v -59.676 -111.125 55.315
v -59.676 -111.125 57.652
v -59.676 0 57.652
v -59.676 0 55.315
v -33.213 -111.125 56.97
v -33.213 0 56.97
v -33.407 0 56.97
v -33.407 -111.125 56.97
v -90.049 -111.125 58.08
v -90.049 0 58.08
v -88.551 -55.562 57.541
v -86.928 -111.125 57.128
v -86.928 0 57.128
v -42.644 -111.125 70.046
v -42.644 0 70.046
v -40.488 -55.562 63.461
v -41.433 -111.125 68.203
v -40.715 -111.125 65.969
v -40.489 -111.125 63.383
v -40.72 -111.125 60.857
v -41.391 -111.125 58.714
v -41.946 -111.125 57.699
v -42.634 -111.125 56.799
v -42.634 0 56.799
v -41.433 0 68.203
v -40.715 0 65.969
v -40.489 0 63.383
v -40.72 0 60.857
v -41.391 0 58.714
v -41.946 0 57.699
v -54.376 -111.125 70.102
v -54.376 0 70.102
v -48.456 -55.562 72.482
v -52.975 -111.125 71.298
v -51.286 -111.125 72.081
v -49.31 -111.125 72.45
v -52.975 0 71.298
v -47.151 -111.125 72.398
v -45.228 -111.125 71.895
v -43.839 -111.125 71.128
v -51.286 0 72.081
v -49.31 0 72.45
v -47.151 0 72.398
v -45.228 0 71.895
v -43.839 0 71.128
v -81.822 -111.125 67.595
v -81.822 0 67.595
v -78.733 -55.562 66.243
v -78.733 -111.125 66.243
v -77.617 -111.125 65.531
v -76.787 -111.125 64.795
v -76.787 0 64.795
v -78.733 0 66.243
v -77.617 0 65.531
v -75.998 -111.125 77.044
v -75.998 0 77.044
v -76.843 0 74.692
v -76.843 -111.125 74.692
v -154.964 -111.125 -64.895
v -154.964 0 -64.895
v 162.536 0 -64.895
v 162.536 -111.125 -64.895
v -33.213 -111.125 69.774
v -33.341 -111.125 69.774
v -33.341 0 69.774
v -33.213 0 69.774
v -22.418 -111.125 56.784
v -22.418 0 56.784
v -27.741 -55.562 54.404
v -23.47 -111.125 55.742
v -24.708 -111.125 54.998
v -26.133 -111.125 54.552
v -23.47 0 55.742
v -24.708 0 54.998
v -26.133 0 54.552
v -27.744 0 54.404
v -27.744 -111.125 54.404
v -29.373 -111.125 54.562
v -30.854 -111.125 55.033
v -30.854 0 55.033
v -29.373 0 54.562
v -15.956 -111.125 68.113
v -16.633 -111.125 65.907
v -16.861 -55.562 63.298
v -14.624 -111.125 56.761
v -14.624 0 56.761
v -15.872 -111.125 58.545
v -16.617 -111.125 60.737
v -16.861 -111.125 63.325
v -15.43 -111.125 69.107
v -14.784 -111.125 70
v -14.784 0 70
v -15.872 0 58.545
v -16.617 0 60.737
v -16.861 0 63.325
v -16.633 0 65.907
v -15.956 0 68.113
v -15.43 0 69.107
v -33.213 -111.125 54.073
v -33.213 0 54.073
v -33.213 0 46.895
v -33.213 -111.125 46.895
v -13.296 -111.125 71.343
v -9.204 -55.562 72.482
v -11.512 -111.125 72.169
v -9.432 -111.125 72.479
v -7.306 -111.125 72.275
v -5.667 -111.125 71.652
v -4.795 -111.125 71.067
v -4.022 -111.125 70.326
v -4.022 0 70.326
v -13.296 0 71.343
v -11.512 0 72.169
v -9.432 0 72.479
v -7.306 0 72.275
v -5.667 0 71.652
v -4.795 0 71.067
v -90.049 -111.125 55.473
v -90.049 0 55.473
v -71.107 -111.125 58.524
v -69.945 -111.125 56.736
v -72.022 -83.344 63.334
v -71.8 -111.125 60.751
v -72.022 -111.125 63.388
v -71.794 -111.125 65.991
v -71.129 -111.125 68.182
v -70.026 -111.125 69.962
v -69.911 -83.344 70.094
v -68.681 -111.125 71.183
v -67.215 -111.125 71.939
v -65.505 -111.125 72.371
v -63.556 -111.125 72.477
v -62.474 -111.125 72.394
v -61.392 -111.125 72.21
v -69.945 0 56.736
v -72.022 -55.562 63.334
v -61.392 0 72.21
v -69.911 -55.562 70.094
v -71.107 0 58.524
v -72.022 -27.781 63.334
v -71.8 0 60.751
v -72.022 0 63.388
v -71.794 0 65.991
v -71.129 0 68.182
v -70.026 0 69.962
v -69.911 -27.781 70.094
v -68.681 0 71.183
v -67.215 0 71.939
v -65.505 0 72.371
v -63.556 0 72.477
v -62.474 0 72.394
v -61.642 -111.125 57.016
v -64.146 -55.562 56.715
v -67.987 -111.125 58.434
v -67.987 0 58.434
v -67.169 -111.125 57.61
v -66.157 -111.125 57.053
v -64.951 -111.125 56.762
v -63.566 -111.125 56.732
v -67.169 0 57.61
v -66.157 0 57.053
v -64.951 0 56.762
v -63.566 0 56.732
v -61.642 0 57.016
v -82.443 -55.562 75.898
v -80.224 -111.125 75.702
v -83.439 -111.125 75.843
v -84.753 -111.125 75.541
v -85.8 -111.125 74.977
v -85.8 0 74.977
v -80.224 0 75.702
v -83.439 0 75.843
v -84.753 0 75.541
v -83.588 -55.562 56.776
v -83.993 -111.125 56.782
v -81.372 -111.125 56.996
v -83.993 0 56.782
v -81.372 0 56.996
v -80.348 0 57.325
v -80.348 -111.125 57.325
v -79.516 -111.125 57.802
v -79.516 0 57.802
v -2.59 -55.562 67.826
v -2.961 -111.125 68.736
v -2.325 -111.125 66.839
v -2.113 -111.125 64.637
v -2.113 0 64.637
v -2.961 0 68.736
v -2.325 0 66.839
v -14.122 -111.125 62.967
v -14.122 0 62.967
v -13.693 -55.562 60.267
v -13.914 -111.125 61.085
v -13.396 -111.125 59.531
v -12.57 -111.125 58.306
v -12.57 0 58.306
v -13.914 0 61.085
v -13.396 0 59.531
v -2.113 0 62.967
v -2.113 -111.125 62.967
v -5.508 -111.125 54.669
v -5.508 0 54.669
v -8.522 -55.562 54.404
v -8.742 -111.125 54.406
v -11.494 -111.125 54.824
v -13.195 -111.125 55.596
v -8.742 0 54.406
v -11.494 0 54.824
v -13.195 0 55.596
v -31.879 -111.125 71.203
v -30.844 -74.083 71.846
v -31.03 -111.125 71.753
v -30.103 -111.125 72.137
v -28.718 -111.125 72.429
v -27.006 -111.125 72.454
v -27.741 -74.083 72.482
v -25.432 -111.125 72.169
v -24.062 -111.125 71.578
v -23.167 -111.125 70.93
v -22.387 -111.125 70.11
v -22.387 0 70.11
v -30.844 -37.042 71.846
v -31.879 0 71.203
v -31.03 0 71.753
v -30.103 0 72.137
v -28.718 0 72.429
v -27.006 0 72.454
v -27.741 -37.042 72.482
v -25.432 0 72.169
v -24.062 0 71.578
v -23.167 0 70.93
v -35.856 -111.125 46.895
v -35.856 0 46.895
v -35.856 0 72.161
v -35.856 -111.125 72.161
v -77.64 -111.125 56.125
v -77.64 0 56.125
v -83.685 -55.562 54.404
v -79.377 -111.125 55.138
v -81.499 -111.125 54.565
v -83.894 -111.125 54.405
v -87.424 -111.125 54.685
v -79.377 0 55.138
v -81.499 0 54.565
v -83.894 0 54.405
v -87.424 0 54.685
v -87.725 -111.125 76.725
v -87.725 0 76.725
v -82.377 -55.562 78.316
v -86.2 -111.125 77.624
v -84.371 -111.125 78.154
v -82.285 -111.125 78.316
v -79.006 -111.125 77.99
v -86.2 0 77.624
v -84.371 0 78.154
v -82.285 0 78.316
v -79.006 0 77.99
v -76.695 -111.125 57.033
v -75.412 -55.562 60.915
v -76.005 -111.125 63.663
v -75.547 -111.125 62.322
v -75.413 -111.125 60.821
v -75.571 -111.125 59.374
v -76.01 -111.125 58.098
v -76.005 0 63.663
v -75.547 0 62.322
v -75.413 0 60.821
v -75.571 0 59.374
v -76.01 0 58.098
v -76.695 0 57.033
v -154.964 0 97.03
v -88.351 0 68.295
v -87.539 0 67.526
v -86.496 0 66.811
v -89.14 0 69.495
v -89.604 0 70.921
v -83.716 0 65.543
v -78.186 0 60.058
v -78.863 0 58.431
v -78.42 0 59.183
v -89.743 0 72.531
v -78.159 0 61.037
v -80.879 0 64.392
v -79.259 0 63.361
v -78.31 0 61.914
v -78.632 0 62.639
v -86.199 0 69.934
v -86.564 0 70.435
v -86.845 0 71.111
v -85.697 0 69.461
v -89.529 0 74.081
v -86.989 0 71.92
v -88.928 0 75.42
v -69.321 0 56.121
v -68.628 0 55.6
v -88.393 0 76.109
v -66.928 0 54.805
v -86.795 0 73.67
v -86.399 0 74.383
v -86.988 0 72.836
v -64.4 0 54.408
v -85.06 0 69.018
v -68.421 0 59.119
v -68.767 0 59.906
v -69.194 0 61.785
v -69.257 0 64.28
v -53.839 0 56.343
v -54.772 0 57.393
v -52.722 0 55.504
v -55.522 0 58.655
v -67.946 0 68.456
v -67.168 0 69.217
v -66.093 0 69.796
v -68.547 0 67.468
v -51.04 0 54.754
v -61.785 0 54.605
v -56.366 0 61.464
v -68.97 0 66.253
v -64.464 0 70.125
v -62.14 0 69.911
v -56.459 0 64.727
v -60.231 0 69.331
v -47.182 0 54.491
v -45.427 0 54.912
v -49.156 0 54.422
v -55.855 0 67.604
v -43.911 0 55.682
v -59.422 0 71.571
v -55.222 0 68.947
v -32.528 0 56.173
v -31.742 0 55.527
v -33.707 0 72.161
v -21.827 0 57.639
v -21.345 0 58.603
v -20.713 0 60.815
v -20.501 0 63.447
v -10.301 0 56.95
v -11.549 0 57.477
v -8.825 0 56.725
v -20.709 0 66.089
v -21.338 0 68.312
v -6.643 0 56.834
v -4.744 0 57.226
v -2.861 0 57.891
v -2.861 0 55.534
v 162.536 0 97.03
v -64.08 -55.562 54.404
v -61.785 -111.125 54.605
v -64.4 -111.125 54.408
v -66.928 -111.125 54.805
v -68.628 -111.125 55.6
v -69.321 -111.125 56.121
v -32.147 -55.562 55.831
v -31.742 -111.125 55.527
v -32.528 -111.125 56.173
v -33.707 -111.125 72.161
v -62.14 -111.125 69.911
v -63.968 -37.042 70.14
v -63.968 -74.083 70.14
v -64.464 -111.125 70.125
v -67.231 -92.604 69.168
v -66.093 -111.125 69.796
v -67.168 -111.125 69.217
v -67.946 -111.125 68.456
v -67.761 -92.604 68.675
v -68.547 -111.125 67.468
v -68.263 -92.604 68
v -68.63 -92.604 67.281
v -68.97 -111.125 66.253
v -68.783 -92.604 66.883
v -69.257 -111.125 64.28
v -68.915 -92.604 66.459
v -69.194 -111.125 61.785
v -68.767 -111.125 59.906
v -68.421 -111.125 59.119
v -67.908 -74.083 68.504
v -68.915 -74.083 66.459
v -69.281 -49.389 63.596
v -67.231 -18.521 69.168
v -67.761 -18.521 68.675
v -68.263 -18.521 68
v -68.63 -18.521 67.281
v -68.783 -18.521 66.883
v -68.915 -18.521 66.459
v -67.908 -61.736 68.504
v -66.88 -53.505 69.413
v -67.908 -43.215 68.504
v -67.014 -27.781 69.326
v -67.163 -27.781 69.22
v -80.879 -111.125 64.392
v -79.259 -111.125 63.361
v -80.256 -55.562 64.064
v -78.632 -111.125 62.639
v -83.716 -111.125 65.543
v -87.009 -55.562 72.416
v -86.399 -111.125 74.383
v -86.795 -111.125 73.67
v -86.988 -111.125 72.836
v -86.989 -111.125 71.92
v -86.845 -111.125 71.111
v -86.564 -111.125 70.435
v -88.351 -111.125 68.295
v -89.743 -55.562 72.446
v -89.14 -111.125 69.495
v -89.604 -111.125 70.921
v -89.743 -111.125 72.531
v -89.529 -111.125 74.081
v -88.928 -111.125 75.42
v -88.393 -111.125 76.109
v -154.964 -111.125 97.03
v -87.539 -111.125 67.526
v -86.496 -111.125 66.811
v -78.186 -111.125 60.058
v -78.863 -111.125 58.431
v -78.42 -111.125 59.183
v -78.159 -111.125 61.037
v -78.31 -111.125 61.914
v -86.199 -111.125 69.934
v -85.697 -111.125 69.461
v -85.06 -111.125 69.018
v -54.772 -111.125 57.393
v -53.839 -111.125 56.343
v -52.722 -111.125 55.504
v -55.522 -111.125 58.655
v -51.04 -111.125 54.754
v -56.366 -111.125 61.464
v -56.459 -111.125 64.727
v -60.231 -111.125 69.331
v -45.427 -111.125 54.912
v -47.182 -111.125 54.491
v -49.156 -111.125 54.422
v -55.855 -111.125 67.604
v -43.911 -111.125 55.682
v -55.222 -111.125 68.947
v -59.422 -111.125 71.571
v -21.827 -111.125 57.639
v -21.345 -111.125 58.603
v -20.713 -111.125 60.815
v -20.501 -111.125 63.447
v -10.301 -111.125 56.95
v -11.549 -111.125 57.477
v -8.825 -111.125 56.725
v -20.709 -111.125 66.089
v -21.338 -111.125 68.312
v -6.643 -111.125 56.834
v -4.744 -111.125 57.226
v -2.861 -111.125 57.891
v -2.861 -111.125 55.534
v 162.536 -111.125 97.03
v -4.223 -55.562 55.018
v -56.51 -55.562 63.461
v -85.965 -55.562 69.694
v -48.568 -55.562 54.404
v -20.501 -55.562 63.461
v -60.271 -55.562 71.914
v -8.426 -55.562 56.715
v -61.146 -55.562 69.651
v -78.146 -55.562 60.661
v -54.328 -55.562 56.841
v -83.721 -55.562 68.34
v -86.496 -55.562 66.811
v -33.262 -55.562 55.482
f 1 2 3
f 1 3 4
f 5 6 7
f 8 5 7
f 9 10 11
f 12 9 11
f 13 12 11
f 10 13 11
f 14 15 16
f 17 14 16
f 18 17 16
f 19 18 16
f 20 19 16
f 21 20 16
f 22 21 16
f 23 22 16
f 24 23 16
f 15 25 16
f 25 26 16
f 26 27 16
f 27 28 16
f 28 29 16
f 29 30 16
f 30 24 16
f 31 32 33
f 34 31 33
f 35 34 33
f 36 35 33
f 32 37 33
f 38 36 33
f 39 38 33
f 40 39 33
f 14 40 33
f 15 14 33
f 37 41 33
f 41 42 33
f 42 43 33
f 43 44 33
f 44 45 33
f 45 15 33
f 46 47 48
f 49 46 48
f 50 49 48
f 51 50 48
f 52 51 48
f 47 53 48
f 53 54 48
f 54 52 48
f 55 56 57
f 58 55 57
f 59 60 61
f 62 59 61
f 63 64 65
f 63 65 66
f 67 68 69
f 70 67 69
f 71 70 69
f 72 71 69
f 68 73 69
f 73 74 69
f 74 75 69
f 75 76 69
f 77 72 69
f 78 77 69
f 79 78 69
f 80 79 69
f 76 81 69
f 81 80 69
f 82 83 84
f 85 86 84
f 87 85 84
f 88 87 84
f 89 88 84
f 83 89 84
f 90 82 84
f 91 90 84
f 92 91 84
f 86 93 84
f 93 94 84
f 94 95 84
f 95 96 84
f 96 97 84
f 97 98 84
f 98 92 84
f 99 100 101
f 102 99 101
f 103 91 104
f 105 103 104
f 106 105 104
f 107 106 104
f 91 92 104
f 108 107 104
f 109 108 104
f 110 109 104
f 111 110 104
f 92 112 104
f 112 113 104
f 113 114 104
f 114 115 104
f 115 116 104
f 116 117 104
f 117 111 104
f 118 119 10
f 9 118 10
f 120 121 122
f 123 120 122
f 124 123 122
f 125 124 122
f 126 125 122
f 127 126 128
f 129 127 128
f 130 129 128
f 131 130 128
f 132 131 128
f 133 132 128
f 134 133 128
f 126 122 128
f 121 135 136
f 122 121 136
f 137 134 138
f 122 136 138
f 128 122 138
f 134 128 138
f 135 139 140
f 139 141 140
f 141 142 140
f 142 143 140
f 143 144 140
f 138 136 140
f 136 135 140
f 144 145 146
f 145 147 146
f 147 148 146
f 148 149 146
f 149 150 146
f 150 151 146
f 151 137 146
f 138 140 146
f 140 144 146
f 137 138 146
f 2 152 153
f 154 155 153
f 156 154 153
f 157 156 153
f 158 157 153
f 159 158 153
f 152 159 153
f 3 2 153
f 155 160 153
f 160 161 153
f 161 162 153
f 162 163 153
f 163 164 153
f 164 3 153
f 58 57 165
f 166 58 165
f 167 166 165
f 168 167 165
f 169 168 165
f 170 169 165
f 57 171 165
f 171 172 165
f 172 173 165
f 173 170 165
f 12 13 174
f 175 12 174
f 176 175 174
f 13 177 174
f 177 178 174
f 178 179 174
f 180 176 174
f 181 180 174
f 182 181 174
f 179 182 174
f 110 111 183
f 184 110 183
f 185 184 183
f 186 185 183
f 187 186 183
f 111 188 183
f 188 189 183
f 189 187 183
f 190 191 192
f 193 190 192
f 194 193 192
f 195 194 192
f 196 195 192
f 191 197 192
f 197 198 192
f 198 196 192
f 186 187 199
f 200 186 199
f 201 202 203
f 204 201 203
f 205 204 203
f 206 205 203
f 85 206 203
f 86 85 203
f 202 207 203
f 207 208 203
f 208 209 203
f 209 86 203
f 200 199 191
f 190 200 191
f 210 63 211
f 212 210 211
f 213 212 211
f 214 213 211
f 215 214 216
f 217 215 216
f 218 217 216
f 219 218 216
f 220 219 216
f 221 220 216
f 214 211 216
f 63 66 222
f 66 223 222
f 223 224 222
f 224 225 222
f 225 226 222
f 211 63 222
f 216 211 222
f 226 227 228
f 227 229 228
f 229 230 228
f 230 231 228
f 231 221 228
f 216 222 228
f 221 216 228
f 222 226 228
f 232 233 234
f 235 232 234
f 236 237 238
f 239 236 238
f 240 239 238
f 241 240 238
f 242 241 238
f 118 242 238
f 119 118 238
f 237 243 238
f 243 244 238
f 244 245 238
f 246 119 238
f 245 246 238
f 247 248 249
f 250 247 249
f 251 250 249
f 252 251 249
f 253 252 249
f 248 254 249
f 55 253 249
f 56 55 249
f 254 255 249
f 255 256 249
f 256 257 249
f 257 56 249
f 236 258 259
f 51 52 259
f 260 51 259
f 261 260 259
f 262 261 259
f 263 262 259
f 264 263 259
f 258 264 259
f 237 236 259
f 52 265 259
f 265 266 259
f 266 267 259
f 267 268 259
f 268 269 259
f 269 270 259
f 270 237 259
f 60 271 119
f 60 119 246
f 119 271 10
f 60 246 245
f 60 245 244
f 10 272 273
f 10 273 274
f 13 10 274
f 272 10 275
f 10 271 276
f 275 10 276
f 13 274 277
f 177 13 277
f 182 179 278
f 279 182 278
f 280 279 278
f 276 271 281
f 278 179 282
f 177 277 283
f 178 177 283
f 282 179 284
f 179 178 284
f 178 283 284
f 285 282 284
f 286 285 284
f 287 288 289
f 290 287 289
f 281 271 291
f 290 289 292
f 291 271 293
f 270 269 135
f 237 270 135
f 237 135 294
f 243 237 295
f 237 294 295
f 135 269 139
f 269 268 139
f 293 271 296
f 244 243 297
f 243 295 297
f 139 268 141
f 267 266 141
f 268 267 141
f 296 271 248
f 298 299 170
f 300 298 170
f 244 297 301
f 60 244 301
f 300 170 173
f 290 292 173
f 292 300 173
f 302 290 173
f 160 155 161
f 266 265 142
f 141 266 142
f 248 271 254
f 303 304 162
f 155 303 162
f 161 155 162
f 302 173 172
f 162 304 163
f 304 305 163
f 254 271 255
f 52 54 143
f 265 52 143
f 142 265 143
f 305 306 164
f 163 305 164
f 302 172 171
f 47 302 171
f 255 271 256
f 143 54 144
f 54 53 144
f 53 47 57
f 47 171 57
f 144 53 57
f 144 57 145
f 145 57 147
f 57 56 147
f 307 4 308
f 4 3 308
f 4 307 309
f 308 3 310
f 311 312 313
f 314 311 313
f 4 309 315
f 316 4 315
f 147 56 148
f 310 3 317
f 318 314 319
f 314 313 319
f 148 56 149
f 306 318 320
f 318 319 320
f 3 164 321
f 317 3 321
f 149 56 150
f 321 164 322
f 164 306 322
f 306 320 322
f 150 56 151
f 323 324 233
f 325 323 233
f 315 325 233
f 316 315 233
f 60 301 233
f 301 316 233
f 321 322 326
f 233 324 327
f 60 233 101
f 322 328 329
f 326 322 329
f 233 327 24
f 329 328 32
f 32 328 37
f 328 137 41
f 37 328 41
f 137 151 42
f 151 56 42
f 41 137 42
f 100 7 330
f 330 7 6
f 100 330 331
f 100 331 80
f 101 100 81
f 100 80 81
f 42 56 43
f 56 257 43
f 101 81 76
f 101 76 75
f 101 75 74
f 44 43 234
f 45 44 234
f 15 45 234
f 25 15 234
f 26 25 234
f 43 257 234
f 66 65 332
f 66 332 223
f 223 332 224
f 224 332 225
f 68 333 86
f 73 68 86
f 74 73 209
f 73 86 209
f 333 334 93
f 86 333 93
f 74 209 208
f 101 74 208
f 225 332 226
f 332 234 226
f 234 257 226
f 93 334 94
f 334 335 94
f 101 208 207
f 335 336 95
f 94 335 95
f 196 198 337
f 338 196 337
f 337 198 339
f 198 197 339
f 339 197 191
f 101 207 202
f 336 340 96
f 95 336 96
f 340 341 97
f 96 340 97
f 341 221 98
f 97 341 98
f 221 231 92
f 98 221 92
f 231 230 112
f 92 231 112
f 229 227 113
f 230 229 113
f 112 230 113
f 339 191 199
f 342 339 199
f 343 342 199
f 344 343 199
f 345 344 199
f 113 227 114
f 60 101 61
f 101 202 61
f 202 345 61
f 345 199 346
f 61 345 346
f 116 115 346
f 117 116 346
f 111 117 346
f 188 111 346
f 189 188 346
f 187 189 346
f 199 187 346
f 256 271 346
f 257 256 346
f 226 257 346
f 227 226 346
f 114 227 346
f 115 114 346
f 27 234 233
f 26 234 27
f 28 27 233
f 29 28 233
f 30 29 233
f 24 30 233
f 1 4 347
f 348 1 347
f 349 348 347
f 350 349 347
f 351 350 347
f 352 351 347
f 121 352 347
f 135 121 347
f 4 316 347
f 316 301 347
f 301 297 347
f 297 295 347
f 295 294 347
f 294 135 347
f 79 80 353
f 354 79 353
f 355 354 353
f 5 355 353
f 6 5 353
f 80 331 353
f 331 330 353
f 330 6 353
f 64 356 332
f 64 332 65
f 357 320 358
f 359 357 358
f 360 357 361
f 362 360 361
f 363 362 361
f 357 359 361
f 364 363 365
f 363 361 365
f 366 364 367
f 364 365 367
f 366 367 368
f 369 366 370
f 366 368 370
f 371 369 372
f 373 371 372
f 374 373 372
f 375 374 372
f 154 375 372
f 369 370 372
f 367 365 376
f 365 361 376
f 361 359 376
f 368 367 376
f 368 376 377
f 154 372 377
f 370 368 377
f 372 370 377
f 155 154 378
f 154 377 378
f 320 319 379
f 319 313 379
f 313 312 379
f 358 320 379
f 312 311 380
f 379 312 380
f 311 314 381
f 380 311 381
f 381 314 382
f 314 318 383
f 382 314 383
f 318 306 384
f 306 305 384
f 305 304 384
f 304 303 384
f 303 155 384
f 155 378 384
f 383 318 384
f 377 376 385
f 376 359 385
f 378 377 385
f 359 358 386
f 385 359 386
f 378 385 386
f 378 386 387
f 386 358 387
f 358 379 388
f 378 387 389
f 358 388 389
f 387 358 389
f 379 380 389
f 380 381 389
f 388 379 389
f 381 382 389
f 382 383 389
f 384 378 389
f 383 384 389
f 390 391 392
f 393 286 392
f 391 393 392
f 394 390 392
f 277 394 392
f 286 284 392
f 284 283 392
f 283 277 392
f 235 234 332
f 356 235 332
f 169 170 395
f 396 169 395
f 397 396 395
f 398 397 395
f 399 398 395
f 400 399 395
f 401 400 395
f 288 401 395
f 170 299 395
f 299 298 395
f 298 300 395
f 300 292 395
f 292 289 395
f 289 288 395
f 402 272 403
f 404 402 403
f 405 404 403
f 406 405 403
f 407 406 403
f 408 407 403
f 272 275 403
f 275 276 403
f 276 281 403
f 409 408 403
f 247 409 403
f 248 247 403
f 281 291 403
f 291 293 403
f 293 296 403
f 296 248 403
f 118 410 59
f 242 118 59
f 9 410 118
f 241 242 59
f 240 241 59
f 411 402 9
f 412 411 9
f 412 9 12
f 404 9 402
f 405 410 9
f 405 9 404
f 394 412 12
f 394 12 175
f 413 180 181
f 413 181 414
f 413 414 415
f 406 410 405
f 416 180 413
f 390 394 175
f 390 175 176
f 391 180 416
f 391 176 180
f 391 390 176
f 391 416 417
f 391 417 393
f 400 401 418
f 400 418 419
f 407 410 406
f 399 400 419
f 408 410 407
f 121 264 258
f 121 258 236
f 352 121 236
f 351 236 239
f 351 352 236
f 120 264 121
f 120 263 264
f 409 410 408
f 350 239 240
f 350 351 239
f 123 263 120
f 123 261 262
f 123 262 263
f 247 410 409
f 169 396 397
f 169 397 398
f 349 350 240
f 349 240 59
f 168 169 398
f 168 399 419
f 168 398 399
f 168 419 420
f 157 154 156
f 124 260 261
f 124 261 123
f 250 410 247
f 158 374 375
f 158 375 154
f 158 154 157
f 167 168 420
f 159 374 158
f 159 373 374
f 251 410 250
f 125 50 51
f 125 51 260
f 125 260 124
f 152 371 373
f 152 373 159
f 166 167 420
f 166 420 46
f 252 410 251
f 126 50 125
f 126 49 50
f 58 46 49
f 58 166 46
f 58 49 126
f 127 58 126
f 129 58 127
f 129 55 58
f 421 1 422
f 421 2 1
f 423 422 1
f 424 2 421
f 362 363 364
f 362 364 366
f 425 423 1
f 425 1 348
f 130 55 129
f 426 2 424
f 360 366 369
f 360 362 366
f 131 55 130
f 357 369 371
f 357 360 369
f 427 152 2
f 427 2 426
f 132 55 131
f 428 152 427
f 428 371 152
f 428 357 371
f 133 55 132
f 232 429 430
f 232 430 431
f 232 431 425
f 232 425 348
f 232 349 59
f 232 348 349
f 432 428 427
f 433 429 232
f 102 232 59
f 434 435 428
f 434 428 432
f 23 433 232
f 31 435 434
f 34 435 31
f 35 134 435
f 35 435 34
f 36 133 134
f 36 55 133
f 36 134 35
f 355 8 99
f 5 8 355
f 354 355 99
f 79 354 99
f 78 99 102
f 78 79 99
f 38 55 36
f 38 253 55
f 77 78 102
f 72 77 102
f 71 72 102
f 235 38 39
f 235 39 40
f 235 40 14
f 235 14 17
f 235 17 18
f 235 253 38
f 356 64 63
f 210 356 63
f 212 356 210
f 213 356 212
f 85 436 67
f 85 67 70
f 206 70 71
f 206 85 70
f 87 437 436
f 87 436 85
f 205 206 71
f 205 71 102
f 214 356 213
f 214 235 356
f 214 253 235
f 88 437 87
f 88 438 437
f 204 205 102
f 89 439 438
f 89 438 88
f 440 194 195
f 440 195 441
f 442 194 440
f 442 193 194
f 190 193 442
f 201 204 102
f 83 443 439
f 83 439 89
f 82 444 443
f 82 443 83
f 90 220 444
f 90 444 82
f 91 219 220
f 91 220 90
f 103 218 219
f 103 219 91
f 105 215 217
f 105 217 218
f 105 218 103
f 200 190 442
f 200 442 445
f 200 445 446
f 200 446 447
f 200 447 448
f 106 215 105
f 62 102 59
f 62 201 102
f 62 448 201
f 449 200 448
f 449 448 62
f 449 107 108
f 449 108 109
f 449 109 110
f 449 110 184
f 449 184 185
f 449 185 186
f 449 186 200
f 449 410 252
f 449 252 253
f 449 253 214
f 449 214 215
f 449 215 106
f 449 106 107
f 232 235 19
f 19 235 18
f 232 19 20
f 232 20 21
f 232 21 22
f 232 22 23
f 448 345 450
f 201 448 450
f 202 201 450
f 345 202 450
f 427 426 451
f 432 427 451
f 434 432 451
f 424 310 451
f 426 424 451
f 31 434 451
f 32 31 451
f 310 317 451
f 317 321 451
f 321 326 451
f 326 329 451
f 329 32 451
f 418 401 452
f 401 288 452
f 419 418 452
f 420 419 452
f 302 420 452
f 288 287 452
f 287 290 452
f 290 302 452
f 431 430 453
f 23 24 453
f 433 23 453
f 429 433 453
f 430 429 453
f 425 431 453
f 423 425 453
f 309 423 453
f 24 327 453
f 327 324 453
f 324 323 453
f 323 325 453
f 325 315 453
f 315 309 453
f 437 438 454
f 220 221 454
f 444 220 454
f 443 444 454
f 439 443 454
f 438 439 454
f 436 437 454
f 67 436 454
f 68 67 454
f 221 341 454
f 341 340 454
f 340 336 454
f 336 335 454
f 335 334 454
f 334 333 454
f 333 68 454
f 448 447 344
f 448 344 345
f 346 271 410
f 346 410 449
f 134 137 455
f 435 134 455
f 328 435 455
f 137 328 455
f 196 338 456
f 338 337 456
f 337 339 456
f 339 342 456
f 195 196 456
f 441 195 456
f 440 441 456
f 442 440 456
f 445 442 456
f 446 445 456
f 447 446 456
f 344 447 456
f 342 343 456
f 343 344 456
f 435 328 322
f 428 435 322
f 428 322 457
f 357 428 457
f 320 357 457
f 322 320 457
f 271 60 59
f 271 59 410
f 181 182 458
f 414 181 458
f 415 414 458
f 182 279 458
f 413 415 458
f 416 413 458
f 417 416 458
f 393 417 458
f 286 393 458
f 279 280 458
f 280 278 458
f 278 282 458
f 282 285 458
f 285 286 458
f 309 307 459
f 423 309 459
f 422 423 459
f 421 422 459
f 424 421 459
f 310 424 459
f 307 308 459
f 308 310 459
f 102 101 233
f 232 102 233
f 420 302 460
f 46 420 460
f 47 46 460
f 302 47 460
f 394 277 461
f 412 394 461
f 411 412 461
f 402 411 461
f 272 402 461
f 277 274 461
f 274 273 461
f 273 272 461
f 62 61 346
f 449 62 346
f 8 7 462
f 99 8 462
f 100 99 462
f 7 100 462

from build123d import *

# Parameters (mm, degrees)
F0_W     = 317.5
F0_H     = 161.925
F1_DEPTH = 111.125


with BuildPart() as f1:
    # F0 (on Front) → F1 (new body)
    with BuildSketch(Plane.XZ):
        with Locations((3.7857389202, 16.0671479534)):
            Rectangle(F0_W, F0_H)
        with BuildLine():
            add(Edge.make_bspline(
                [(-76.786822499, 64.7946904907), (-75.4122655757, 63.2979507297), (-75.4122655757, 60.9153853959)],
                knots=[0, 0, 0, 1, 1, 1], degree=2))
            add(Edge.make_bspline(
                [(-75.4122655757, 60.9153853959), (-75.4122655757, 57.8455416005), (-77.6395568867, 56.1247999705)],
                knots=[0, 0, 0, 1, 1, 1], degree=2))
            add(Edge.make_bspline(
                [(-77.6395568867, 56.1247999705), (-79.8668481976, 54.4040583405), (-83.6850618736, 54.4040583405)],
                knots=[0, 0, 0, 1, 1, 1], degree=2))
            add(Edge.make_bspline(
                [(-83.6850618736, 54.4040583405), (-87.8189145467, 54.4040583405), (-90.0487513335, 55.4731581698)],
                knots=[0, 0, 0, 1, 1, 1], degree=2))
            Line((-90.0487513335, 55.4731581698), (-90.0487513335, 58.0797253726))
            add(Edge.make_bspline(
                [(-90.0487513335, 58.0797253726), (-88.6131029913, 57.4789930876), (-86.9279980224, 57.1277174294)],
                knots=[0, 0, 0, 1, 1, 1], degree=2))
            add(Edge.make_bspline(
                [(-86.9279980224, 57.1277174294), (-85.2428930534, 56.7764417712), (-83.5883337938, 56.7764417712)],
                knots=[0, 0, 0, 1, 1, 1], degree=2))
            add(Edge.make_bspline(
                [(-83.5883337938, 56.7764417712), (-80.8850385112, 56.7764417712), (-79.5155725395, 57.8022685121)],
                knots=[0, 0, 0, 1, 1, 1], degree=2))
            add(Edge.make_bspline(
                [(-79.5155725395, 57.8022685121), (-78.1461065677, 58.8280952531), (-78.1461065677, 60.6608378175)],
                knots=[0, 0, 0, 1, 1, 1], degree=2))
            add(Edge.make_bspline(
                [(-78.1461065677, 60.6608378175), (-78.1461065677, 61.8673933391), (-78.6322924424, 62.6386725017)],
                knots=[0, 0, 0, 1, 1, 1], degree=2))
            add(Edge.make_bspline(
                [(-78.6322924424, 62.6386725017), (-79.1184783172, 63.4099516642), (-80.2563059926, 64.0641389407)],
                knots=[0, 0, 0, 1, 1, 1], degree=2))
            add(Edge.make_bspline(
                [(-80.2563059926, 64.0641389407), (-81.394133668, 64.7183262172), (-83.715607583, 65.5430603712)],
                knots=[0, 0, 0, 1, 1, 1], degree=2))
            add(Edge.make_bspline(
                [(-83.715607583, 65.5430603712), (-86.9585437318, 66.7037973287), (-88.3509189856, 68.2947196936)],
                knots=[0, 0, 0, 1, 1, 1], degree=2))
            add(Edge.make_bspline(
                [(-88.3509189856, 68.2947196936), (-89.7432942394, 69.8856420586), (-89.7432942394, 72.4463906973)],
                knots=[0, 0, 0, 1, 1, 1], degree=2))
            add(Edge.make_bspline(
                [(-89.7432942394, 72.4463906973), (-89.7432942394, 75.1344131251), (-87.7247319427, 76.7253354901)],
                knots=[0, 0, 0, 1, 1, 1], degree=2))
            add(Edge.make_bspline(
                [(-87.7247319427, 76.7253354901), (-85.7061696461, 78.3162578551), (-82.3766873206, 78.3162578551)],
                knots=[0, 0, 0, 1, 1, 1], degree=2))
            add(Edge.make_bspline(
                [(-82.3766873206, 78.3162578551), (-78.9097493029, 78.3162578551), (-75.997725006, 77.0435199631)],
                knots=[0, 0, 0, 1, 1, 1], degree=2))
            Line((-75.997725006, 77.0435199631), (-76.8428229663, 74.6915003387))
            add(Edge.make_bspline(
                [(-76.8428229663, 74.6915003387), (-79.7243015537, 75.8980558603), (-82.442869691, 75.8980558603)],
                knots=[0, 0, 0, 1, 1, 1], degree=2))
            add(Edge.make_bspline(
                [(-82.442869691, 75.8980558603), (-84.5912512527, 75.8980558603), (-85.8003522501, 74.9765936265)],
                knots=[0, 0, 0, 1, 1, 1], degree=2))
            add(Edge.make_bspline(
                [(-85.8003522501, 74.9765936265), (-87.0094532474, 74.0551313927), (-87.0094532474, 72.4158449879)],
                knots=[0, 0, 0, 1, 1, 1], degree=2))
            add(Edge.make_bspline(
                [(-87.0094532474, 72.4158449879), (-87.0094532474, 71.2092894663), (-86.5639949852, 70.4354648279)],
                knots=[0, 0, 0, 1, 1, 1], degree=2))
            add(Edge.make_bspline(
                [(-86.5639949852, 70.4354648279), (-86.1185367231, 69.6616401896), (-85.0596187969, 69.0176348163)],
                knots=[0, 0, 0, 1, 1, 1], degree=2))
            add(Edge.make_bspline(
                [(-85.0596187969, 69.0176348163), (-84.0007008708, 68.3736294429), (-81.8217735997, 67.594713853)],
                knots=[0, 0, 0, 1, 1, 1], degree=2))
            add(Edge.make_bspline(
                [(-81.8217735997, 67.594713853), (-78.1613794224, 66.2914302517), (-76.786822499, 64.7946904907)],
                knots=[0, 0, 0, 1, 1, 1], degree=2))
        make_face(mode=Mode.SUBTRACT)
        with BuildLine():
            add(Edge.make_bspline(
                [(-59.6761342792, 55.3153386712), (-61.422330667, 54.4040583405), (-64.0798073855, 54.4040583405)],
                knots=[0, 0, 0, 1, 1, 1], degree=2))
            add(Edge.make_bspline(
                [(-64.0798073855, 54.4040583405), (-67.867475352, 54.4040583405), (-69.9445835918, 56.7357141587)],
                knots=[0, 0, 0, 1, 1, 1], degree=2))
            add(Edge.make_bspline(
                [(-69.9445835918, 56.7357141587), (-72.0216918315, 59.0673699768), (-72.0216918315, 63.3335873907)],
                knots=[0, 0, 0, 1, 1, 1], degree=2))
            add(Edge.make_bspline(
                [(-72.0216918315, 63.3335873907), (-72.0216918315, 67.7067147875), (-69.9114924066, 70.0943710729)],
                knots=[0, 0, 0, 1, 1, 1], degree=2))
            add(Edge.make_bspline(
                [(-69.9114924066, 70.0943710729), (-67.8012929817, 72.4820273583), (-63.9067150322, 72.4820273583)],
                knots=[0, 0, 0, 1, 1, 1], degree=2))
            add(Edge.make_bspline(
                [(-63.9067150322, 72.4820273583), (-62.6492499949, 72.4820273583), (-61.3917849576, 72.2096614494)],
                knots=[0, 0, 0, 1, 1, 1], degree=2))
            add(Edge.make_bspline(
                [(-61.3917849576, 72.2096614494), (-60.1343199204, 71.9372955405), (-59.4215867008, 71.5707470276)],
                knots=[0, 0, 0, 1, 1, 1], degree=2))
            Line((-59.4215867008, 71.5707470276), (-60.2310480001, 69.3307283377))
            add(Edge.make_bspline(
                [(-60.2310480001, 69.3307283377), (-61.1066916698, 69.6820039959), (-62.1401548381, 69.9110968164)],
                knots=[0, 0, 0, 1, 1, 1], degree=2))
            add(Edge.make_bspline(
                [(-62.1401548381, 69.9110968164), (-63.1736180064, 70.140189637), (-63.967806451, 70.140189637)],
                knots=[0, 0, 0, 1, 1, 1], degree=2))
            add(Edge.make_bspline(
                [(-63.967806451, 70.140189637), (-69.2827598879, 70.140189637), (-69.2827598879, 63.3641331001)],
                knots=[0, 0, 0, 1, 1, 1], degree=2))
            add(Edge.make_bspline(
                [(-69.2827598879, 63.3641331001), (-69.2827598879, 60.1517426607), (-67.9871127139, 58.4335465066)],
                knots=[0, 0, 0, 1, 1, 1], degree=2))
            add(Edge.make_bspline(
                [(-67.9871127139, 58.4335465066), (-66.6914655398, 56.7153503524), (-64.1459897559, 56.7153503524)],
                knots=[0, 0, 0, 1, 1, 1], degree=2))
            add(Edge.make_bspline(
                [(-64.1459897559, 56.7153503524), (-61.9670624848, 56.7153503524), (-59.6761342792, 57.6520854409)],
                knots=[0, 0, 0, 1, 1, 1], degree=2))
            Line((-59.6761342792, 57.6520854409), (-59.6761342792, 55.3153386712))
        make_face(mode=Mode.SUBTRACT)
        with BuildLine():
            add(Edge.make_bspline(
                [(-42.6443558087, 70.046007033), (-40.4883378197, 67.6099867077), (-40.4883378197, 63.4608611799)],
                knots=[0, 0, 0, 1, 1, 1], degree=2))
            add(Edge.make_bspline(
                [(-40.4883378197, 63.4608611799), (-40.4883378197, 59.194643766), (-42.6341739056, 56.7993510533)],
                knots=[0, 0, 0, 1, 1, 1], degree=2))
            add(Edge.make_bspline(
                [(-42.6341739056, 56.7993510533), (-44.7800099915, 54.4040583405), (-48.567677958, 54.4040583405)],
                knots=[0, 0, 0, 1, 1, 1], degree=2))
            add(Edge.make_bspline(
                [(-48.567677958, 54.4040583405), (-50.9095156793, 54.4040583405), (-52.7218944375, 55.5037038792)],
                knots=[0, 0, 0, 1, 1, 1], degree=2))
            add(Edge.make_bspline(
                [(-52.7218944375, 55.5037038792), (-54.5342731956, 56.6033494179), (-55.5219177998, 58.6550028998)],
                knots=[0, 0, 0, 1, 1, 1], degree=2))
            add(Edge.make_bspline(
                [(-55.5219177998, 58.6550028998), (-56.509562404, 60.7066563816), (-56.509562404, 63.4608611799)],
                knots=[0, 0, 0, 1, 1, 1], degree=2))
            add(Edge.make_bspline(
                [(-56.509562404, 63.4608611799), (-56.509562404, 67.7219876422), (-54.376453697, 70.1020075002)],
                knots=[0, 0, 0, 1, 1, 1], degree=2))
            add(Edge.make_bspline(
                [(-54.376453697, 70.1020075002), (-52.2433449901, 72.4820273583), (-48.4556770235, 72.4820273583)],
                knots=[0, 0, 0, 1, 1, 1], degree=2))
            add(Edge.make_bspline(
                [(-48.4556770235, 72.4820273583), (-44.8003737978, 72.4820273583), (-42.6443558087, 70.046007033)],
                knots=[0, 0, 0, 1, 1, 1], degree=2))
        make_face(mode=Mode.SUBTRACT)
        with BuildLine():
            add(Edge.make_bspline(
                [(-22.4180052294, 56.7840781985), (-24.3347484947, 54.4040583405), (-27.7405950936, 54.4040583405)],
                knots=[0, 0, 0, 1, 1, 1], degree=2))
            add(Edge.make_bspline(
                [(-27.7405950936, 54.4040583405), (-29.4460638689, 54.4040583405), (-30.8537119774, 55.0327908592)],
                knots=[0, 0, 0, 1, 1, 1], degree=2))
            add(Edge.make_bspline(
                [(-30.8537119774, 55.0327908592), (-32.261360086, 55.6615233778), (-33.2133680292, 56.9698979308)],
                knots=[0, 0, 0, 1, 1, 1], degree=2))
            Line((-33.2133680292, 56.9698979308), (-33.4068241887, 56.9698979308))
            add(Edge.make_bspline(
                [(-33.4068241887, 56.9698979308), (-33.2133680292, 55.4426124604), (-33.2133680292, 54.0731464886)],
                knots=[0, 0, 0, 1, 1, 1], degree=2))
            Line((-33.2133680292, 54.0731464886), (-33.2133680292, 46.8949047778))
            Line((-33.2133680292, 46.8949047778), (-35.8555718929, 46.8949047778))
            Line((-35.8555718929, 46.8949047778), (-35.8555718929, 72.1612974095))
            Line((-35.8555718929, 72.1612974095), (-33.7071903312, 72.1612974095))
            Line((-33.7071903312, 72.1612974095), (-33.3406418184, 69.7736411241))
            Line((-33.3406418184, 69.7736411241), (-33.2133680292, 69.7736411241))
            add(Edge.make_bspline(
                [(-33.2133680292, 69.7736411241), (-32.1951777156, 71.2092894663), (-30.8435300743, 71.8456584123)],
                knots=[0, 0, 0, 1, 1, 1], degree=2))
            add(Edge.make_bspline(
                [(-30.8435300743, 71.8456584123), (-29.491882433, 72.4820273583), (-27.7405950936, 72.4820273583)],
                knots=[0, 0, 0, 1, 1, 1], degree=2))
            add(Edge.make_bspline(
                [(-27.7405950936, 72.4820273583), (-24.2736570759, 72.4820273583), (-22.38745952, 70.1096439276)],
                knots=[0, 0, 0, 1, 1, 1], degree=2))
            add(Edge.make_bspline(
                [(-22.38745952, 70.1096439276), (-20.501261964, 67.7372604969), (-20.501261964, 63.4608611799)],
                knots=[0, 0, 0, 1, 1, 1], degree=2))
            add(Edge.make_bspline(
                [(-20.501261964, 63.4608611799), (-20.501261964, 59.1640980566), (-22.4180052294, 56.7840781985)],
                knots=[0, 0, 0, 1, 1, 1], degree=2))
        make_face(mode=Mode.SUBTRACT)
        with BuildLine():
            add(Edge.make_bspline(
                [(-5.5084095965, 54.6687878221), (-6.7556927306, 54.4040583405), (-8.5222529247, 54.4040583405)],
                knots=[0, 0, 0, 1, 1, 1], degree=2))
            add(Edge.make_bspline(
                [(-8.5222529247, 54.4040583405), (-12.3862851648, 54.4040583405), (-14.6237583789, 56.7611689165)],
                knots=[0, 0, 0, 1, 1, 1], degree=2))
            add(Edge.make_bspline(
                [(-14.6237583789, 56.7611689165), (-16.861231593, 59.1182794924), (-16.861231593, 63.2979507297)],
                knots=[0, 0, 0, 1, 1, 1], degree=2))
            add(Edge.make_bspline(
                [(-16.861231593, 63.2979507297), (-16.861231593, 67.5183495795), (-14.7841233533, 70.0001884689)],
                knots=[0, 0, 0, 1, 1, 1], degree=2))
            add(Edge.make_bspline(
                [(-14.7841233533, 70.0001884689), (-12.7070151135, 72.4820273583), (-9.2044404348, 72.4820273583)],
                knots=[0, 0, 0, 1, 1, 1], degree=2))
            add(Edge.make_bspline(
                [(-9.2044404348, 72.4820273583), (-5.9309585766, 72.4820273583), (-4.0218517387, 70.3260093692)],
                knots=[0, 0, 0, 1, 1, 1], degree=2))
            add(Edge.make_bspline(
                [(-4.0218517387, 70.3260093692), (-2.1127449007, 68.1699913802), (-2.1127449007, 64.6368709921)],
                knots=[0, 0, 0, 1, 1, 1], degree=2))
            Line((-2.1127449007, 64.6368709921), (-2.1127449007, 62.9670388778))
            Line((-2.1127449007, 62.9670388778), (-14.1222996494, 62.9670388778))
            add(Edge.make_bspline(
                [(-14.1222996494, 62.9670388778), (-14.0408444243, 59.8971950823), (-12.5695594212, 58.3062727174)],
                knots=[0, 0, 0, 1, 1, 1], degree=2))
            add(Edge.make_bspline(
                [(-12.5695594212, 58.3062727174), (-11.0982744181, 56.7153503524), (-8.4255248449, 56.7153503524)],
                knots=[0, 0, 0, 1, 1, 1], degree=2))
            add(Edge.make_bspline(
                [(-8.4255248449, 56.7153503524), (-5.6102286279, 56.7153503524), (-2.8611147812, 57.8913601646)],
                knots=[0, 0, 0, 1, 1, 1], degree=2))
            Line((-2.8611147812, 57.8913601646), (-2.8611147812, 55.5342495886))
            add(Edge.make_bspline(
                [(-2.8611147812, 55.5342495886), (-4.2611264624, 54.9335173036), (-5.5084095965, 54.6687878221)],
                knots=[0, 0, 0, 1, 1, 1], degree=2))
        make_face(mode=Mode.SUBTRACT)
    extrude(amount=F1_DEPTH)


solid = f1.part
